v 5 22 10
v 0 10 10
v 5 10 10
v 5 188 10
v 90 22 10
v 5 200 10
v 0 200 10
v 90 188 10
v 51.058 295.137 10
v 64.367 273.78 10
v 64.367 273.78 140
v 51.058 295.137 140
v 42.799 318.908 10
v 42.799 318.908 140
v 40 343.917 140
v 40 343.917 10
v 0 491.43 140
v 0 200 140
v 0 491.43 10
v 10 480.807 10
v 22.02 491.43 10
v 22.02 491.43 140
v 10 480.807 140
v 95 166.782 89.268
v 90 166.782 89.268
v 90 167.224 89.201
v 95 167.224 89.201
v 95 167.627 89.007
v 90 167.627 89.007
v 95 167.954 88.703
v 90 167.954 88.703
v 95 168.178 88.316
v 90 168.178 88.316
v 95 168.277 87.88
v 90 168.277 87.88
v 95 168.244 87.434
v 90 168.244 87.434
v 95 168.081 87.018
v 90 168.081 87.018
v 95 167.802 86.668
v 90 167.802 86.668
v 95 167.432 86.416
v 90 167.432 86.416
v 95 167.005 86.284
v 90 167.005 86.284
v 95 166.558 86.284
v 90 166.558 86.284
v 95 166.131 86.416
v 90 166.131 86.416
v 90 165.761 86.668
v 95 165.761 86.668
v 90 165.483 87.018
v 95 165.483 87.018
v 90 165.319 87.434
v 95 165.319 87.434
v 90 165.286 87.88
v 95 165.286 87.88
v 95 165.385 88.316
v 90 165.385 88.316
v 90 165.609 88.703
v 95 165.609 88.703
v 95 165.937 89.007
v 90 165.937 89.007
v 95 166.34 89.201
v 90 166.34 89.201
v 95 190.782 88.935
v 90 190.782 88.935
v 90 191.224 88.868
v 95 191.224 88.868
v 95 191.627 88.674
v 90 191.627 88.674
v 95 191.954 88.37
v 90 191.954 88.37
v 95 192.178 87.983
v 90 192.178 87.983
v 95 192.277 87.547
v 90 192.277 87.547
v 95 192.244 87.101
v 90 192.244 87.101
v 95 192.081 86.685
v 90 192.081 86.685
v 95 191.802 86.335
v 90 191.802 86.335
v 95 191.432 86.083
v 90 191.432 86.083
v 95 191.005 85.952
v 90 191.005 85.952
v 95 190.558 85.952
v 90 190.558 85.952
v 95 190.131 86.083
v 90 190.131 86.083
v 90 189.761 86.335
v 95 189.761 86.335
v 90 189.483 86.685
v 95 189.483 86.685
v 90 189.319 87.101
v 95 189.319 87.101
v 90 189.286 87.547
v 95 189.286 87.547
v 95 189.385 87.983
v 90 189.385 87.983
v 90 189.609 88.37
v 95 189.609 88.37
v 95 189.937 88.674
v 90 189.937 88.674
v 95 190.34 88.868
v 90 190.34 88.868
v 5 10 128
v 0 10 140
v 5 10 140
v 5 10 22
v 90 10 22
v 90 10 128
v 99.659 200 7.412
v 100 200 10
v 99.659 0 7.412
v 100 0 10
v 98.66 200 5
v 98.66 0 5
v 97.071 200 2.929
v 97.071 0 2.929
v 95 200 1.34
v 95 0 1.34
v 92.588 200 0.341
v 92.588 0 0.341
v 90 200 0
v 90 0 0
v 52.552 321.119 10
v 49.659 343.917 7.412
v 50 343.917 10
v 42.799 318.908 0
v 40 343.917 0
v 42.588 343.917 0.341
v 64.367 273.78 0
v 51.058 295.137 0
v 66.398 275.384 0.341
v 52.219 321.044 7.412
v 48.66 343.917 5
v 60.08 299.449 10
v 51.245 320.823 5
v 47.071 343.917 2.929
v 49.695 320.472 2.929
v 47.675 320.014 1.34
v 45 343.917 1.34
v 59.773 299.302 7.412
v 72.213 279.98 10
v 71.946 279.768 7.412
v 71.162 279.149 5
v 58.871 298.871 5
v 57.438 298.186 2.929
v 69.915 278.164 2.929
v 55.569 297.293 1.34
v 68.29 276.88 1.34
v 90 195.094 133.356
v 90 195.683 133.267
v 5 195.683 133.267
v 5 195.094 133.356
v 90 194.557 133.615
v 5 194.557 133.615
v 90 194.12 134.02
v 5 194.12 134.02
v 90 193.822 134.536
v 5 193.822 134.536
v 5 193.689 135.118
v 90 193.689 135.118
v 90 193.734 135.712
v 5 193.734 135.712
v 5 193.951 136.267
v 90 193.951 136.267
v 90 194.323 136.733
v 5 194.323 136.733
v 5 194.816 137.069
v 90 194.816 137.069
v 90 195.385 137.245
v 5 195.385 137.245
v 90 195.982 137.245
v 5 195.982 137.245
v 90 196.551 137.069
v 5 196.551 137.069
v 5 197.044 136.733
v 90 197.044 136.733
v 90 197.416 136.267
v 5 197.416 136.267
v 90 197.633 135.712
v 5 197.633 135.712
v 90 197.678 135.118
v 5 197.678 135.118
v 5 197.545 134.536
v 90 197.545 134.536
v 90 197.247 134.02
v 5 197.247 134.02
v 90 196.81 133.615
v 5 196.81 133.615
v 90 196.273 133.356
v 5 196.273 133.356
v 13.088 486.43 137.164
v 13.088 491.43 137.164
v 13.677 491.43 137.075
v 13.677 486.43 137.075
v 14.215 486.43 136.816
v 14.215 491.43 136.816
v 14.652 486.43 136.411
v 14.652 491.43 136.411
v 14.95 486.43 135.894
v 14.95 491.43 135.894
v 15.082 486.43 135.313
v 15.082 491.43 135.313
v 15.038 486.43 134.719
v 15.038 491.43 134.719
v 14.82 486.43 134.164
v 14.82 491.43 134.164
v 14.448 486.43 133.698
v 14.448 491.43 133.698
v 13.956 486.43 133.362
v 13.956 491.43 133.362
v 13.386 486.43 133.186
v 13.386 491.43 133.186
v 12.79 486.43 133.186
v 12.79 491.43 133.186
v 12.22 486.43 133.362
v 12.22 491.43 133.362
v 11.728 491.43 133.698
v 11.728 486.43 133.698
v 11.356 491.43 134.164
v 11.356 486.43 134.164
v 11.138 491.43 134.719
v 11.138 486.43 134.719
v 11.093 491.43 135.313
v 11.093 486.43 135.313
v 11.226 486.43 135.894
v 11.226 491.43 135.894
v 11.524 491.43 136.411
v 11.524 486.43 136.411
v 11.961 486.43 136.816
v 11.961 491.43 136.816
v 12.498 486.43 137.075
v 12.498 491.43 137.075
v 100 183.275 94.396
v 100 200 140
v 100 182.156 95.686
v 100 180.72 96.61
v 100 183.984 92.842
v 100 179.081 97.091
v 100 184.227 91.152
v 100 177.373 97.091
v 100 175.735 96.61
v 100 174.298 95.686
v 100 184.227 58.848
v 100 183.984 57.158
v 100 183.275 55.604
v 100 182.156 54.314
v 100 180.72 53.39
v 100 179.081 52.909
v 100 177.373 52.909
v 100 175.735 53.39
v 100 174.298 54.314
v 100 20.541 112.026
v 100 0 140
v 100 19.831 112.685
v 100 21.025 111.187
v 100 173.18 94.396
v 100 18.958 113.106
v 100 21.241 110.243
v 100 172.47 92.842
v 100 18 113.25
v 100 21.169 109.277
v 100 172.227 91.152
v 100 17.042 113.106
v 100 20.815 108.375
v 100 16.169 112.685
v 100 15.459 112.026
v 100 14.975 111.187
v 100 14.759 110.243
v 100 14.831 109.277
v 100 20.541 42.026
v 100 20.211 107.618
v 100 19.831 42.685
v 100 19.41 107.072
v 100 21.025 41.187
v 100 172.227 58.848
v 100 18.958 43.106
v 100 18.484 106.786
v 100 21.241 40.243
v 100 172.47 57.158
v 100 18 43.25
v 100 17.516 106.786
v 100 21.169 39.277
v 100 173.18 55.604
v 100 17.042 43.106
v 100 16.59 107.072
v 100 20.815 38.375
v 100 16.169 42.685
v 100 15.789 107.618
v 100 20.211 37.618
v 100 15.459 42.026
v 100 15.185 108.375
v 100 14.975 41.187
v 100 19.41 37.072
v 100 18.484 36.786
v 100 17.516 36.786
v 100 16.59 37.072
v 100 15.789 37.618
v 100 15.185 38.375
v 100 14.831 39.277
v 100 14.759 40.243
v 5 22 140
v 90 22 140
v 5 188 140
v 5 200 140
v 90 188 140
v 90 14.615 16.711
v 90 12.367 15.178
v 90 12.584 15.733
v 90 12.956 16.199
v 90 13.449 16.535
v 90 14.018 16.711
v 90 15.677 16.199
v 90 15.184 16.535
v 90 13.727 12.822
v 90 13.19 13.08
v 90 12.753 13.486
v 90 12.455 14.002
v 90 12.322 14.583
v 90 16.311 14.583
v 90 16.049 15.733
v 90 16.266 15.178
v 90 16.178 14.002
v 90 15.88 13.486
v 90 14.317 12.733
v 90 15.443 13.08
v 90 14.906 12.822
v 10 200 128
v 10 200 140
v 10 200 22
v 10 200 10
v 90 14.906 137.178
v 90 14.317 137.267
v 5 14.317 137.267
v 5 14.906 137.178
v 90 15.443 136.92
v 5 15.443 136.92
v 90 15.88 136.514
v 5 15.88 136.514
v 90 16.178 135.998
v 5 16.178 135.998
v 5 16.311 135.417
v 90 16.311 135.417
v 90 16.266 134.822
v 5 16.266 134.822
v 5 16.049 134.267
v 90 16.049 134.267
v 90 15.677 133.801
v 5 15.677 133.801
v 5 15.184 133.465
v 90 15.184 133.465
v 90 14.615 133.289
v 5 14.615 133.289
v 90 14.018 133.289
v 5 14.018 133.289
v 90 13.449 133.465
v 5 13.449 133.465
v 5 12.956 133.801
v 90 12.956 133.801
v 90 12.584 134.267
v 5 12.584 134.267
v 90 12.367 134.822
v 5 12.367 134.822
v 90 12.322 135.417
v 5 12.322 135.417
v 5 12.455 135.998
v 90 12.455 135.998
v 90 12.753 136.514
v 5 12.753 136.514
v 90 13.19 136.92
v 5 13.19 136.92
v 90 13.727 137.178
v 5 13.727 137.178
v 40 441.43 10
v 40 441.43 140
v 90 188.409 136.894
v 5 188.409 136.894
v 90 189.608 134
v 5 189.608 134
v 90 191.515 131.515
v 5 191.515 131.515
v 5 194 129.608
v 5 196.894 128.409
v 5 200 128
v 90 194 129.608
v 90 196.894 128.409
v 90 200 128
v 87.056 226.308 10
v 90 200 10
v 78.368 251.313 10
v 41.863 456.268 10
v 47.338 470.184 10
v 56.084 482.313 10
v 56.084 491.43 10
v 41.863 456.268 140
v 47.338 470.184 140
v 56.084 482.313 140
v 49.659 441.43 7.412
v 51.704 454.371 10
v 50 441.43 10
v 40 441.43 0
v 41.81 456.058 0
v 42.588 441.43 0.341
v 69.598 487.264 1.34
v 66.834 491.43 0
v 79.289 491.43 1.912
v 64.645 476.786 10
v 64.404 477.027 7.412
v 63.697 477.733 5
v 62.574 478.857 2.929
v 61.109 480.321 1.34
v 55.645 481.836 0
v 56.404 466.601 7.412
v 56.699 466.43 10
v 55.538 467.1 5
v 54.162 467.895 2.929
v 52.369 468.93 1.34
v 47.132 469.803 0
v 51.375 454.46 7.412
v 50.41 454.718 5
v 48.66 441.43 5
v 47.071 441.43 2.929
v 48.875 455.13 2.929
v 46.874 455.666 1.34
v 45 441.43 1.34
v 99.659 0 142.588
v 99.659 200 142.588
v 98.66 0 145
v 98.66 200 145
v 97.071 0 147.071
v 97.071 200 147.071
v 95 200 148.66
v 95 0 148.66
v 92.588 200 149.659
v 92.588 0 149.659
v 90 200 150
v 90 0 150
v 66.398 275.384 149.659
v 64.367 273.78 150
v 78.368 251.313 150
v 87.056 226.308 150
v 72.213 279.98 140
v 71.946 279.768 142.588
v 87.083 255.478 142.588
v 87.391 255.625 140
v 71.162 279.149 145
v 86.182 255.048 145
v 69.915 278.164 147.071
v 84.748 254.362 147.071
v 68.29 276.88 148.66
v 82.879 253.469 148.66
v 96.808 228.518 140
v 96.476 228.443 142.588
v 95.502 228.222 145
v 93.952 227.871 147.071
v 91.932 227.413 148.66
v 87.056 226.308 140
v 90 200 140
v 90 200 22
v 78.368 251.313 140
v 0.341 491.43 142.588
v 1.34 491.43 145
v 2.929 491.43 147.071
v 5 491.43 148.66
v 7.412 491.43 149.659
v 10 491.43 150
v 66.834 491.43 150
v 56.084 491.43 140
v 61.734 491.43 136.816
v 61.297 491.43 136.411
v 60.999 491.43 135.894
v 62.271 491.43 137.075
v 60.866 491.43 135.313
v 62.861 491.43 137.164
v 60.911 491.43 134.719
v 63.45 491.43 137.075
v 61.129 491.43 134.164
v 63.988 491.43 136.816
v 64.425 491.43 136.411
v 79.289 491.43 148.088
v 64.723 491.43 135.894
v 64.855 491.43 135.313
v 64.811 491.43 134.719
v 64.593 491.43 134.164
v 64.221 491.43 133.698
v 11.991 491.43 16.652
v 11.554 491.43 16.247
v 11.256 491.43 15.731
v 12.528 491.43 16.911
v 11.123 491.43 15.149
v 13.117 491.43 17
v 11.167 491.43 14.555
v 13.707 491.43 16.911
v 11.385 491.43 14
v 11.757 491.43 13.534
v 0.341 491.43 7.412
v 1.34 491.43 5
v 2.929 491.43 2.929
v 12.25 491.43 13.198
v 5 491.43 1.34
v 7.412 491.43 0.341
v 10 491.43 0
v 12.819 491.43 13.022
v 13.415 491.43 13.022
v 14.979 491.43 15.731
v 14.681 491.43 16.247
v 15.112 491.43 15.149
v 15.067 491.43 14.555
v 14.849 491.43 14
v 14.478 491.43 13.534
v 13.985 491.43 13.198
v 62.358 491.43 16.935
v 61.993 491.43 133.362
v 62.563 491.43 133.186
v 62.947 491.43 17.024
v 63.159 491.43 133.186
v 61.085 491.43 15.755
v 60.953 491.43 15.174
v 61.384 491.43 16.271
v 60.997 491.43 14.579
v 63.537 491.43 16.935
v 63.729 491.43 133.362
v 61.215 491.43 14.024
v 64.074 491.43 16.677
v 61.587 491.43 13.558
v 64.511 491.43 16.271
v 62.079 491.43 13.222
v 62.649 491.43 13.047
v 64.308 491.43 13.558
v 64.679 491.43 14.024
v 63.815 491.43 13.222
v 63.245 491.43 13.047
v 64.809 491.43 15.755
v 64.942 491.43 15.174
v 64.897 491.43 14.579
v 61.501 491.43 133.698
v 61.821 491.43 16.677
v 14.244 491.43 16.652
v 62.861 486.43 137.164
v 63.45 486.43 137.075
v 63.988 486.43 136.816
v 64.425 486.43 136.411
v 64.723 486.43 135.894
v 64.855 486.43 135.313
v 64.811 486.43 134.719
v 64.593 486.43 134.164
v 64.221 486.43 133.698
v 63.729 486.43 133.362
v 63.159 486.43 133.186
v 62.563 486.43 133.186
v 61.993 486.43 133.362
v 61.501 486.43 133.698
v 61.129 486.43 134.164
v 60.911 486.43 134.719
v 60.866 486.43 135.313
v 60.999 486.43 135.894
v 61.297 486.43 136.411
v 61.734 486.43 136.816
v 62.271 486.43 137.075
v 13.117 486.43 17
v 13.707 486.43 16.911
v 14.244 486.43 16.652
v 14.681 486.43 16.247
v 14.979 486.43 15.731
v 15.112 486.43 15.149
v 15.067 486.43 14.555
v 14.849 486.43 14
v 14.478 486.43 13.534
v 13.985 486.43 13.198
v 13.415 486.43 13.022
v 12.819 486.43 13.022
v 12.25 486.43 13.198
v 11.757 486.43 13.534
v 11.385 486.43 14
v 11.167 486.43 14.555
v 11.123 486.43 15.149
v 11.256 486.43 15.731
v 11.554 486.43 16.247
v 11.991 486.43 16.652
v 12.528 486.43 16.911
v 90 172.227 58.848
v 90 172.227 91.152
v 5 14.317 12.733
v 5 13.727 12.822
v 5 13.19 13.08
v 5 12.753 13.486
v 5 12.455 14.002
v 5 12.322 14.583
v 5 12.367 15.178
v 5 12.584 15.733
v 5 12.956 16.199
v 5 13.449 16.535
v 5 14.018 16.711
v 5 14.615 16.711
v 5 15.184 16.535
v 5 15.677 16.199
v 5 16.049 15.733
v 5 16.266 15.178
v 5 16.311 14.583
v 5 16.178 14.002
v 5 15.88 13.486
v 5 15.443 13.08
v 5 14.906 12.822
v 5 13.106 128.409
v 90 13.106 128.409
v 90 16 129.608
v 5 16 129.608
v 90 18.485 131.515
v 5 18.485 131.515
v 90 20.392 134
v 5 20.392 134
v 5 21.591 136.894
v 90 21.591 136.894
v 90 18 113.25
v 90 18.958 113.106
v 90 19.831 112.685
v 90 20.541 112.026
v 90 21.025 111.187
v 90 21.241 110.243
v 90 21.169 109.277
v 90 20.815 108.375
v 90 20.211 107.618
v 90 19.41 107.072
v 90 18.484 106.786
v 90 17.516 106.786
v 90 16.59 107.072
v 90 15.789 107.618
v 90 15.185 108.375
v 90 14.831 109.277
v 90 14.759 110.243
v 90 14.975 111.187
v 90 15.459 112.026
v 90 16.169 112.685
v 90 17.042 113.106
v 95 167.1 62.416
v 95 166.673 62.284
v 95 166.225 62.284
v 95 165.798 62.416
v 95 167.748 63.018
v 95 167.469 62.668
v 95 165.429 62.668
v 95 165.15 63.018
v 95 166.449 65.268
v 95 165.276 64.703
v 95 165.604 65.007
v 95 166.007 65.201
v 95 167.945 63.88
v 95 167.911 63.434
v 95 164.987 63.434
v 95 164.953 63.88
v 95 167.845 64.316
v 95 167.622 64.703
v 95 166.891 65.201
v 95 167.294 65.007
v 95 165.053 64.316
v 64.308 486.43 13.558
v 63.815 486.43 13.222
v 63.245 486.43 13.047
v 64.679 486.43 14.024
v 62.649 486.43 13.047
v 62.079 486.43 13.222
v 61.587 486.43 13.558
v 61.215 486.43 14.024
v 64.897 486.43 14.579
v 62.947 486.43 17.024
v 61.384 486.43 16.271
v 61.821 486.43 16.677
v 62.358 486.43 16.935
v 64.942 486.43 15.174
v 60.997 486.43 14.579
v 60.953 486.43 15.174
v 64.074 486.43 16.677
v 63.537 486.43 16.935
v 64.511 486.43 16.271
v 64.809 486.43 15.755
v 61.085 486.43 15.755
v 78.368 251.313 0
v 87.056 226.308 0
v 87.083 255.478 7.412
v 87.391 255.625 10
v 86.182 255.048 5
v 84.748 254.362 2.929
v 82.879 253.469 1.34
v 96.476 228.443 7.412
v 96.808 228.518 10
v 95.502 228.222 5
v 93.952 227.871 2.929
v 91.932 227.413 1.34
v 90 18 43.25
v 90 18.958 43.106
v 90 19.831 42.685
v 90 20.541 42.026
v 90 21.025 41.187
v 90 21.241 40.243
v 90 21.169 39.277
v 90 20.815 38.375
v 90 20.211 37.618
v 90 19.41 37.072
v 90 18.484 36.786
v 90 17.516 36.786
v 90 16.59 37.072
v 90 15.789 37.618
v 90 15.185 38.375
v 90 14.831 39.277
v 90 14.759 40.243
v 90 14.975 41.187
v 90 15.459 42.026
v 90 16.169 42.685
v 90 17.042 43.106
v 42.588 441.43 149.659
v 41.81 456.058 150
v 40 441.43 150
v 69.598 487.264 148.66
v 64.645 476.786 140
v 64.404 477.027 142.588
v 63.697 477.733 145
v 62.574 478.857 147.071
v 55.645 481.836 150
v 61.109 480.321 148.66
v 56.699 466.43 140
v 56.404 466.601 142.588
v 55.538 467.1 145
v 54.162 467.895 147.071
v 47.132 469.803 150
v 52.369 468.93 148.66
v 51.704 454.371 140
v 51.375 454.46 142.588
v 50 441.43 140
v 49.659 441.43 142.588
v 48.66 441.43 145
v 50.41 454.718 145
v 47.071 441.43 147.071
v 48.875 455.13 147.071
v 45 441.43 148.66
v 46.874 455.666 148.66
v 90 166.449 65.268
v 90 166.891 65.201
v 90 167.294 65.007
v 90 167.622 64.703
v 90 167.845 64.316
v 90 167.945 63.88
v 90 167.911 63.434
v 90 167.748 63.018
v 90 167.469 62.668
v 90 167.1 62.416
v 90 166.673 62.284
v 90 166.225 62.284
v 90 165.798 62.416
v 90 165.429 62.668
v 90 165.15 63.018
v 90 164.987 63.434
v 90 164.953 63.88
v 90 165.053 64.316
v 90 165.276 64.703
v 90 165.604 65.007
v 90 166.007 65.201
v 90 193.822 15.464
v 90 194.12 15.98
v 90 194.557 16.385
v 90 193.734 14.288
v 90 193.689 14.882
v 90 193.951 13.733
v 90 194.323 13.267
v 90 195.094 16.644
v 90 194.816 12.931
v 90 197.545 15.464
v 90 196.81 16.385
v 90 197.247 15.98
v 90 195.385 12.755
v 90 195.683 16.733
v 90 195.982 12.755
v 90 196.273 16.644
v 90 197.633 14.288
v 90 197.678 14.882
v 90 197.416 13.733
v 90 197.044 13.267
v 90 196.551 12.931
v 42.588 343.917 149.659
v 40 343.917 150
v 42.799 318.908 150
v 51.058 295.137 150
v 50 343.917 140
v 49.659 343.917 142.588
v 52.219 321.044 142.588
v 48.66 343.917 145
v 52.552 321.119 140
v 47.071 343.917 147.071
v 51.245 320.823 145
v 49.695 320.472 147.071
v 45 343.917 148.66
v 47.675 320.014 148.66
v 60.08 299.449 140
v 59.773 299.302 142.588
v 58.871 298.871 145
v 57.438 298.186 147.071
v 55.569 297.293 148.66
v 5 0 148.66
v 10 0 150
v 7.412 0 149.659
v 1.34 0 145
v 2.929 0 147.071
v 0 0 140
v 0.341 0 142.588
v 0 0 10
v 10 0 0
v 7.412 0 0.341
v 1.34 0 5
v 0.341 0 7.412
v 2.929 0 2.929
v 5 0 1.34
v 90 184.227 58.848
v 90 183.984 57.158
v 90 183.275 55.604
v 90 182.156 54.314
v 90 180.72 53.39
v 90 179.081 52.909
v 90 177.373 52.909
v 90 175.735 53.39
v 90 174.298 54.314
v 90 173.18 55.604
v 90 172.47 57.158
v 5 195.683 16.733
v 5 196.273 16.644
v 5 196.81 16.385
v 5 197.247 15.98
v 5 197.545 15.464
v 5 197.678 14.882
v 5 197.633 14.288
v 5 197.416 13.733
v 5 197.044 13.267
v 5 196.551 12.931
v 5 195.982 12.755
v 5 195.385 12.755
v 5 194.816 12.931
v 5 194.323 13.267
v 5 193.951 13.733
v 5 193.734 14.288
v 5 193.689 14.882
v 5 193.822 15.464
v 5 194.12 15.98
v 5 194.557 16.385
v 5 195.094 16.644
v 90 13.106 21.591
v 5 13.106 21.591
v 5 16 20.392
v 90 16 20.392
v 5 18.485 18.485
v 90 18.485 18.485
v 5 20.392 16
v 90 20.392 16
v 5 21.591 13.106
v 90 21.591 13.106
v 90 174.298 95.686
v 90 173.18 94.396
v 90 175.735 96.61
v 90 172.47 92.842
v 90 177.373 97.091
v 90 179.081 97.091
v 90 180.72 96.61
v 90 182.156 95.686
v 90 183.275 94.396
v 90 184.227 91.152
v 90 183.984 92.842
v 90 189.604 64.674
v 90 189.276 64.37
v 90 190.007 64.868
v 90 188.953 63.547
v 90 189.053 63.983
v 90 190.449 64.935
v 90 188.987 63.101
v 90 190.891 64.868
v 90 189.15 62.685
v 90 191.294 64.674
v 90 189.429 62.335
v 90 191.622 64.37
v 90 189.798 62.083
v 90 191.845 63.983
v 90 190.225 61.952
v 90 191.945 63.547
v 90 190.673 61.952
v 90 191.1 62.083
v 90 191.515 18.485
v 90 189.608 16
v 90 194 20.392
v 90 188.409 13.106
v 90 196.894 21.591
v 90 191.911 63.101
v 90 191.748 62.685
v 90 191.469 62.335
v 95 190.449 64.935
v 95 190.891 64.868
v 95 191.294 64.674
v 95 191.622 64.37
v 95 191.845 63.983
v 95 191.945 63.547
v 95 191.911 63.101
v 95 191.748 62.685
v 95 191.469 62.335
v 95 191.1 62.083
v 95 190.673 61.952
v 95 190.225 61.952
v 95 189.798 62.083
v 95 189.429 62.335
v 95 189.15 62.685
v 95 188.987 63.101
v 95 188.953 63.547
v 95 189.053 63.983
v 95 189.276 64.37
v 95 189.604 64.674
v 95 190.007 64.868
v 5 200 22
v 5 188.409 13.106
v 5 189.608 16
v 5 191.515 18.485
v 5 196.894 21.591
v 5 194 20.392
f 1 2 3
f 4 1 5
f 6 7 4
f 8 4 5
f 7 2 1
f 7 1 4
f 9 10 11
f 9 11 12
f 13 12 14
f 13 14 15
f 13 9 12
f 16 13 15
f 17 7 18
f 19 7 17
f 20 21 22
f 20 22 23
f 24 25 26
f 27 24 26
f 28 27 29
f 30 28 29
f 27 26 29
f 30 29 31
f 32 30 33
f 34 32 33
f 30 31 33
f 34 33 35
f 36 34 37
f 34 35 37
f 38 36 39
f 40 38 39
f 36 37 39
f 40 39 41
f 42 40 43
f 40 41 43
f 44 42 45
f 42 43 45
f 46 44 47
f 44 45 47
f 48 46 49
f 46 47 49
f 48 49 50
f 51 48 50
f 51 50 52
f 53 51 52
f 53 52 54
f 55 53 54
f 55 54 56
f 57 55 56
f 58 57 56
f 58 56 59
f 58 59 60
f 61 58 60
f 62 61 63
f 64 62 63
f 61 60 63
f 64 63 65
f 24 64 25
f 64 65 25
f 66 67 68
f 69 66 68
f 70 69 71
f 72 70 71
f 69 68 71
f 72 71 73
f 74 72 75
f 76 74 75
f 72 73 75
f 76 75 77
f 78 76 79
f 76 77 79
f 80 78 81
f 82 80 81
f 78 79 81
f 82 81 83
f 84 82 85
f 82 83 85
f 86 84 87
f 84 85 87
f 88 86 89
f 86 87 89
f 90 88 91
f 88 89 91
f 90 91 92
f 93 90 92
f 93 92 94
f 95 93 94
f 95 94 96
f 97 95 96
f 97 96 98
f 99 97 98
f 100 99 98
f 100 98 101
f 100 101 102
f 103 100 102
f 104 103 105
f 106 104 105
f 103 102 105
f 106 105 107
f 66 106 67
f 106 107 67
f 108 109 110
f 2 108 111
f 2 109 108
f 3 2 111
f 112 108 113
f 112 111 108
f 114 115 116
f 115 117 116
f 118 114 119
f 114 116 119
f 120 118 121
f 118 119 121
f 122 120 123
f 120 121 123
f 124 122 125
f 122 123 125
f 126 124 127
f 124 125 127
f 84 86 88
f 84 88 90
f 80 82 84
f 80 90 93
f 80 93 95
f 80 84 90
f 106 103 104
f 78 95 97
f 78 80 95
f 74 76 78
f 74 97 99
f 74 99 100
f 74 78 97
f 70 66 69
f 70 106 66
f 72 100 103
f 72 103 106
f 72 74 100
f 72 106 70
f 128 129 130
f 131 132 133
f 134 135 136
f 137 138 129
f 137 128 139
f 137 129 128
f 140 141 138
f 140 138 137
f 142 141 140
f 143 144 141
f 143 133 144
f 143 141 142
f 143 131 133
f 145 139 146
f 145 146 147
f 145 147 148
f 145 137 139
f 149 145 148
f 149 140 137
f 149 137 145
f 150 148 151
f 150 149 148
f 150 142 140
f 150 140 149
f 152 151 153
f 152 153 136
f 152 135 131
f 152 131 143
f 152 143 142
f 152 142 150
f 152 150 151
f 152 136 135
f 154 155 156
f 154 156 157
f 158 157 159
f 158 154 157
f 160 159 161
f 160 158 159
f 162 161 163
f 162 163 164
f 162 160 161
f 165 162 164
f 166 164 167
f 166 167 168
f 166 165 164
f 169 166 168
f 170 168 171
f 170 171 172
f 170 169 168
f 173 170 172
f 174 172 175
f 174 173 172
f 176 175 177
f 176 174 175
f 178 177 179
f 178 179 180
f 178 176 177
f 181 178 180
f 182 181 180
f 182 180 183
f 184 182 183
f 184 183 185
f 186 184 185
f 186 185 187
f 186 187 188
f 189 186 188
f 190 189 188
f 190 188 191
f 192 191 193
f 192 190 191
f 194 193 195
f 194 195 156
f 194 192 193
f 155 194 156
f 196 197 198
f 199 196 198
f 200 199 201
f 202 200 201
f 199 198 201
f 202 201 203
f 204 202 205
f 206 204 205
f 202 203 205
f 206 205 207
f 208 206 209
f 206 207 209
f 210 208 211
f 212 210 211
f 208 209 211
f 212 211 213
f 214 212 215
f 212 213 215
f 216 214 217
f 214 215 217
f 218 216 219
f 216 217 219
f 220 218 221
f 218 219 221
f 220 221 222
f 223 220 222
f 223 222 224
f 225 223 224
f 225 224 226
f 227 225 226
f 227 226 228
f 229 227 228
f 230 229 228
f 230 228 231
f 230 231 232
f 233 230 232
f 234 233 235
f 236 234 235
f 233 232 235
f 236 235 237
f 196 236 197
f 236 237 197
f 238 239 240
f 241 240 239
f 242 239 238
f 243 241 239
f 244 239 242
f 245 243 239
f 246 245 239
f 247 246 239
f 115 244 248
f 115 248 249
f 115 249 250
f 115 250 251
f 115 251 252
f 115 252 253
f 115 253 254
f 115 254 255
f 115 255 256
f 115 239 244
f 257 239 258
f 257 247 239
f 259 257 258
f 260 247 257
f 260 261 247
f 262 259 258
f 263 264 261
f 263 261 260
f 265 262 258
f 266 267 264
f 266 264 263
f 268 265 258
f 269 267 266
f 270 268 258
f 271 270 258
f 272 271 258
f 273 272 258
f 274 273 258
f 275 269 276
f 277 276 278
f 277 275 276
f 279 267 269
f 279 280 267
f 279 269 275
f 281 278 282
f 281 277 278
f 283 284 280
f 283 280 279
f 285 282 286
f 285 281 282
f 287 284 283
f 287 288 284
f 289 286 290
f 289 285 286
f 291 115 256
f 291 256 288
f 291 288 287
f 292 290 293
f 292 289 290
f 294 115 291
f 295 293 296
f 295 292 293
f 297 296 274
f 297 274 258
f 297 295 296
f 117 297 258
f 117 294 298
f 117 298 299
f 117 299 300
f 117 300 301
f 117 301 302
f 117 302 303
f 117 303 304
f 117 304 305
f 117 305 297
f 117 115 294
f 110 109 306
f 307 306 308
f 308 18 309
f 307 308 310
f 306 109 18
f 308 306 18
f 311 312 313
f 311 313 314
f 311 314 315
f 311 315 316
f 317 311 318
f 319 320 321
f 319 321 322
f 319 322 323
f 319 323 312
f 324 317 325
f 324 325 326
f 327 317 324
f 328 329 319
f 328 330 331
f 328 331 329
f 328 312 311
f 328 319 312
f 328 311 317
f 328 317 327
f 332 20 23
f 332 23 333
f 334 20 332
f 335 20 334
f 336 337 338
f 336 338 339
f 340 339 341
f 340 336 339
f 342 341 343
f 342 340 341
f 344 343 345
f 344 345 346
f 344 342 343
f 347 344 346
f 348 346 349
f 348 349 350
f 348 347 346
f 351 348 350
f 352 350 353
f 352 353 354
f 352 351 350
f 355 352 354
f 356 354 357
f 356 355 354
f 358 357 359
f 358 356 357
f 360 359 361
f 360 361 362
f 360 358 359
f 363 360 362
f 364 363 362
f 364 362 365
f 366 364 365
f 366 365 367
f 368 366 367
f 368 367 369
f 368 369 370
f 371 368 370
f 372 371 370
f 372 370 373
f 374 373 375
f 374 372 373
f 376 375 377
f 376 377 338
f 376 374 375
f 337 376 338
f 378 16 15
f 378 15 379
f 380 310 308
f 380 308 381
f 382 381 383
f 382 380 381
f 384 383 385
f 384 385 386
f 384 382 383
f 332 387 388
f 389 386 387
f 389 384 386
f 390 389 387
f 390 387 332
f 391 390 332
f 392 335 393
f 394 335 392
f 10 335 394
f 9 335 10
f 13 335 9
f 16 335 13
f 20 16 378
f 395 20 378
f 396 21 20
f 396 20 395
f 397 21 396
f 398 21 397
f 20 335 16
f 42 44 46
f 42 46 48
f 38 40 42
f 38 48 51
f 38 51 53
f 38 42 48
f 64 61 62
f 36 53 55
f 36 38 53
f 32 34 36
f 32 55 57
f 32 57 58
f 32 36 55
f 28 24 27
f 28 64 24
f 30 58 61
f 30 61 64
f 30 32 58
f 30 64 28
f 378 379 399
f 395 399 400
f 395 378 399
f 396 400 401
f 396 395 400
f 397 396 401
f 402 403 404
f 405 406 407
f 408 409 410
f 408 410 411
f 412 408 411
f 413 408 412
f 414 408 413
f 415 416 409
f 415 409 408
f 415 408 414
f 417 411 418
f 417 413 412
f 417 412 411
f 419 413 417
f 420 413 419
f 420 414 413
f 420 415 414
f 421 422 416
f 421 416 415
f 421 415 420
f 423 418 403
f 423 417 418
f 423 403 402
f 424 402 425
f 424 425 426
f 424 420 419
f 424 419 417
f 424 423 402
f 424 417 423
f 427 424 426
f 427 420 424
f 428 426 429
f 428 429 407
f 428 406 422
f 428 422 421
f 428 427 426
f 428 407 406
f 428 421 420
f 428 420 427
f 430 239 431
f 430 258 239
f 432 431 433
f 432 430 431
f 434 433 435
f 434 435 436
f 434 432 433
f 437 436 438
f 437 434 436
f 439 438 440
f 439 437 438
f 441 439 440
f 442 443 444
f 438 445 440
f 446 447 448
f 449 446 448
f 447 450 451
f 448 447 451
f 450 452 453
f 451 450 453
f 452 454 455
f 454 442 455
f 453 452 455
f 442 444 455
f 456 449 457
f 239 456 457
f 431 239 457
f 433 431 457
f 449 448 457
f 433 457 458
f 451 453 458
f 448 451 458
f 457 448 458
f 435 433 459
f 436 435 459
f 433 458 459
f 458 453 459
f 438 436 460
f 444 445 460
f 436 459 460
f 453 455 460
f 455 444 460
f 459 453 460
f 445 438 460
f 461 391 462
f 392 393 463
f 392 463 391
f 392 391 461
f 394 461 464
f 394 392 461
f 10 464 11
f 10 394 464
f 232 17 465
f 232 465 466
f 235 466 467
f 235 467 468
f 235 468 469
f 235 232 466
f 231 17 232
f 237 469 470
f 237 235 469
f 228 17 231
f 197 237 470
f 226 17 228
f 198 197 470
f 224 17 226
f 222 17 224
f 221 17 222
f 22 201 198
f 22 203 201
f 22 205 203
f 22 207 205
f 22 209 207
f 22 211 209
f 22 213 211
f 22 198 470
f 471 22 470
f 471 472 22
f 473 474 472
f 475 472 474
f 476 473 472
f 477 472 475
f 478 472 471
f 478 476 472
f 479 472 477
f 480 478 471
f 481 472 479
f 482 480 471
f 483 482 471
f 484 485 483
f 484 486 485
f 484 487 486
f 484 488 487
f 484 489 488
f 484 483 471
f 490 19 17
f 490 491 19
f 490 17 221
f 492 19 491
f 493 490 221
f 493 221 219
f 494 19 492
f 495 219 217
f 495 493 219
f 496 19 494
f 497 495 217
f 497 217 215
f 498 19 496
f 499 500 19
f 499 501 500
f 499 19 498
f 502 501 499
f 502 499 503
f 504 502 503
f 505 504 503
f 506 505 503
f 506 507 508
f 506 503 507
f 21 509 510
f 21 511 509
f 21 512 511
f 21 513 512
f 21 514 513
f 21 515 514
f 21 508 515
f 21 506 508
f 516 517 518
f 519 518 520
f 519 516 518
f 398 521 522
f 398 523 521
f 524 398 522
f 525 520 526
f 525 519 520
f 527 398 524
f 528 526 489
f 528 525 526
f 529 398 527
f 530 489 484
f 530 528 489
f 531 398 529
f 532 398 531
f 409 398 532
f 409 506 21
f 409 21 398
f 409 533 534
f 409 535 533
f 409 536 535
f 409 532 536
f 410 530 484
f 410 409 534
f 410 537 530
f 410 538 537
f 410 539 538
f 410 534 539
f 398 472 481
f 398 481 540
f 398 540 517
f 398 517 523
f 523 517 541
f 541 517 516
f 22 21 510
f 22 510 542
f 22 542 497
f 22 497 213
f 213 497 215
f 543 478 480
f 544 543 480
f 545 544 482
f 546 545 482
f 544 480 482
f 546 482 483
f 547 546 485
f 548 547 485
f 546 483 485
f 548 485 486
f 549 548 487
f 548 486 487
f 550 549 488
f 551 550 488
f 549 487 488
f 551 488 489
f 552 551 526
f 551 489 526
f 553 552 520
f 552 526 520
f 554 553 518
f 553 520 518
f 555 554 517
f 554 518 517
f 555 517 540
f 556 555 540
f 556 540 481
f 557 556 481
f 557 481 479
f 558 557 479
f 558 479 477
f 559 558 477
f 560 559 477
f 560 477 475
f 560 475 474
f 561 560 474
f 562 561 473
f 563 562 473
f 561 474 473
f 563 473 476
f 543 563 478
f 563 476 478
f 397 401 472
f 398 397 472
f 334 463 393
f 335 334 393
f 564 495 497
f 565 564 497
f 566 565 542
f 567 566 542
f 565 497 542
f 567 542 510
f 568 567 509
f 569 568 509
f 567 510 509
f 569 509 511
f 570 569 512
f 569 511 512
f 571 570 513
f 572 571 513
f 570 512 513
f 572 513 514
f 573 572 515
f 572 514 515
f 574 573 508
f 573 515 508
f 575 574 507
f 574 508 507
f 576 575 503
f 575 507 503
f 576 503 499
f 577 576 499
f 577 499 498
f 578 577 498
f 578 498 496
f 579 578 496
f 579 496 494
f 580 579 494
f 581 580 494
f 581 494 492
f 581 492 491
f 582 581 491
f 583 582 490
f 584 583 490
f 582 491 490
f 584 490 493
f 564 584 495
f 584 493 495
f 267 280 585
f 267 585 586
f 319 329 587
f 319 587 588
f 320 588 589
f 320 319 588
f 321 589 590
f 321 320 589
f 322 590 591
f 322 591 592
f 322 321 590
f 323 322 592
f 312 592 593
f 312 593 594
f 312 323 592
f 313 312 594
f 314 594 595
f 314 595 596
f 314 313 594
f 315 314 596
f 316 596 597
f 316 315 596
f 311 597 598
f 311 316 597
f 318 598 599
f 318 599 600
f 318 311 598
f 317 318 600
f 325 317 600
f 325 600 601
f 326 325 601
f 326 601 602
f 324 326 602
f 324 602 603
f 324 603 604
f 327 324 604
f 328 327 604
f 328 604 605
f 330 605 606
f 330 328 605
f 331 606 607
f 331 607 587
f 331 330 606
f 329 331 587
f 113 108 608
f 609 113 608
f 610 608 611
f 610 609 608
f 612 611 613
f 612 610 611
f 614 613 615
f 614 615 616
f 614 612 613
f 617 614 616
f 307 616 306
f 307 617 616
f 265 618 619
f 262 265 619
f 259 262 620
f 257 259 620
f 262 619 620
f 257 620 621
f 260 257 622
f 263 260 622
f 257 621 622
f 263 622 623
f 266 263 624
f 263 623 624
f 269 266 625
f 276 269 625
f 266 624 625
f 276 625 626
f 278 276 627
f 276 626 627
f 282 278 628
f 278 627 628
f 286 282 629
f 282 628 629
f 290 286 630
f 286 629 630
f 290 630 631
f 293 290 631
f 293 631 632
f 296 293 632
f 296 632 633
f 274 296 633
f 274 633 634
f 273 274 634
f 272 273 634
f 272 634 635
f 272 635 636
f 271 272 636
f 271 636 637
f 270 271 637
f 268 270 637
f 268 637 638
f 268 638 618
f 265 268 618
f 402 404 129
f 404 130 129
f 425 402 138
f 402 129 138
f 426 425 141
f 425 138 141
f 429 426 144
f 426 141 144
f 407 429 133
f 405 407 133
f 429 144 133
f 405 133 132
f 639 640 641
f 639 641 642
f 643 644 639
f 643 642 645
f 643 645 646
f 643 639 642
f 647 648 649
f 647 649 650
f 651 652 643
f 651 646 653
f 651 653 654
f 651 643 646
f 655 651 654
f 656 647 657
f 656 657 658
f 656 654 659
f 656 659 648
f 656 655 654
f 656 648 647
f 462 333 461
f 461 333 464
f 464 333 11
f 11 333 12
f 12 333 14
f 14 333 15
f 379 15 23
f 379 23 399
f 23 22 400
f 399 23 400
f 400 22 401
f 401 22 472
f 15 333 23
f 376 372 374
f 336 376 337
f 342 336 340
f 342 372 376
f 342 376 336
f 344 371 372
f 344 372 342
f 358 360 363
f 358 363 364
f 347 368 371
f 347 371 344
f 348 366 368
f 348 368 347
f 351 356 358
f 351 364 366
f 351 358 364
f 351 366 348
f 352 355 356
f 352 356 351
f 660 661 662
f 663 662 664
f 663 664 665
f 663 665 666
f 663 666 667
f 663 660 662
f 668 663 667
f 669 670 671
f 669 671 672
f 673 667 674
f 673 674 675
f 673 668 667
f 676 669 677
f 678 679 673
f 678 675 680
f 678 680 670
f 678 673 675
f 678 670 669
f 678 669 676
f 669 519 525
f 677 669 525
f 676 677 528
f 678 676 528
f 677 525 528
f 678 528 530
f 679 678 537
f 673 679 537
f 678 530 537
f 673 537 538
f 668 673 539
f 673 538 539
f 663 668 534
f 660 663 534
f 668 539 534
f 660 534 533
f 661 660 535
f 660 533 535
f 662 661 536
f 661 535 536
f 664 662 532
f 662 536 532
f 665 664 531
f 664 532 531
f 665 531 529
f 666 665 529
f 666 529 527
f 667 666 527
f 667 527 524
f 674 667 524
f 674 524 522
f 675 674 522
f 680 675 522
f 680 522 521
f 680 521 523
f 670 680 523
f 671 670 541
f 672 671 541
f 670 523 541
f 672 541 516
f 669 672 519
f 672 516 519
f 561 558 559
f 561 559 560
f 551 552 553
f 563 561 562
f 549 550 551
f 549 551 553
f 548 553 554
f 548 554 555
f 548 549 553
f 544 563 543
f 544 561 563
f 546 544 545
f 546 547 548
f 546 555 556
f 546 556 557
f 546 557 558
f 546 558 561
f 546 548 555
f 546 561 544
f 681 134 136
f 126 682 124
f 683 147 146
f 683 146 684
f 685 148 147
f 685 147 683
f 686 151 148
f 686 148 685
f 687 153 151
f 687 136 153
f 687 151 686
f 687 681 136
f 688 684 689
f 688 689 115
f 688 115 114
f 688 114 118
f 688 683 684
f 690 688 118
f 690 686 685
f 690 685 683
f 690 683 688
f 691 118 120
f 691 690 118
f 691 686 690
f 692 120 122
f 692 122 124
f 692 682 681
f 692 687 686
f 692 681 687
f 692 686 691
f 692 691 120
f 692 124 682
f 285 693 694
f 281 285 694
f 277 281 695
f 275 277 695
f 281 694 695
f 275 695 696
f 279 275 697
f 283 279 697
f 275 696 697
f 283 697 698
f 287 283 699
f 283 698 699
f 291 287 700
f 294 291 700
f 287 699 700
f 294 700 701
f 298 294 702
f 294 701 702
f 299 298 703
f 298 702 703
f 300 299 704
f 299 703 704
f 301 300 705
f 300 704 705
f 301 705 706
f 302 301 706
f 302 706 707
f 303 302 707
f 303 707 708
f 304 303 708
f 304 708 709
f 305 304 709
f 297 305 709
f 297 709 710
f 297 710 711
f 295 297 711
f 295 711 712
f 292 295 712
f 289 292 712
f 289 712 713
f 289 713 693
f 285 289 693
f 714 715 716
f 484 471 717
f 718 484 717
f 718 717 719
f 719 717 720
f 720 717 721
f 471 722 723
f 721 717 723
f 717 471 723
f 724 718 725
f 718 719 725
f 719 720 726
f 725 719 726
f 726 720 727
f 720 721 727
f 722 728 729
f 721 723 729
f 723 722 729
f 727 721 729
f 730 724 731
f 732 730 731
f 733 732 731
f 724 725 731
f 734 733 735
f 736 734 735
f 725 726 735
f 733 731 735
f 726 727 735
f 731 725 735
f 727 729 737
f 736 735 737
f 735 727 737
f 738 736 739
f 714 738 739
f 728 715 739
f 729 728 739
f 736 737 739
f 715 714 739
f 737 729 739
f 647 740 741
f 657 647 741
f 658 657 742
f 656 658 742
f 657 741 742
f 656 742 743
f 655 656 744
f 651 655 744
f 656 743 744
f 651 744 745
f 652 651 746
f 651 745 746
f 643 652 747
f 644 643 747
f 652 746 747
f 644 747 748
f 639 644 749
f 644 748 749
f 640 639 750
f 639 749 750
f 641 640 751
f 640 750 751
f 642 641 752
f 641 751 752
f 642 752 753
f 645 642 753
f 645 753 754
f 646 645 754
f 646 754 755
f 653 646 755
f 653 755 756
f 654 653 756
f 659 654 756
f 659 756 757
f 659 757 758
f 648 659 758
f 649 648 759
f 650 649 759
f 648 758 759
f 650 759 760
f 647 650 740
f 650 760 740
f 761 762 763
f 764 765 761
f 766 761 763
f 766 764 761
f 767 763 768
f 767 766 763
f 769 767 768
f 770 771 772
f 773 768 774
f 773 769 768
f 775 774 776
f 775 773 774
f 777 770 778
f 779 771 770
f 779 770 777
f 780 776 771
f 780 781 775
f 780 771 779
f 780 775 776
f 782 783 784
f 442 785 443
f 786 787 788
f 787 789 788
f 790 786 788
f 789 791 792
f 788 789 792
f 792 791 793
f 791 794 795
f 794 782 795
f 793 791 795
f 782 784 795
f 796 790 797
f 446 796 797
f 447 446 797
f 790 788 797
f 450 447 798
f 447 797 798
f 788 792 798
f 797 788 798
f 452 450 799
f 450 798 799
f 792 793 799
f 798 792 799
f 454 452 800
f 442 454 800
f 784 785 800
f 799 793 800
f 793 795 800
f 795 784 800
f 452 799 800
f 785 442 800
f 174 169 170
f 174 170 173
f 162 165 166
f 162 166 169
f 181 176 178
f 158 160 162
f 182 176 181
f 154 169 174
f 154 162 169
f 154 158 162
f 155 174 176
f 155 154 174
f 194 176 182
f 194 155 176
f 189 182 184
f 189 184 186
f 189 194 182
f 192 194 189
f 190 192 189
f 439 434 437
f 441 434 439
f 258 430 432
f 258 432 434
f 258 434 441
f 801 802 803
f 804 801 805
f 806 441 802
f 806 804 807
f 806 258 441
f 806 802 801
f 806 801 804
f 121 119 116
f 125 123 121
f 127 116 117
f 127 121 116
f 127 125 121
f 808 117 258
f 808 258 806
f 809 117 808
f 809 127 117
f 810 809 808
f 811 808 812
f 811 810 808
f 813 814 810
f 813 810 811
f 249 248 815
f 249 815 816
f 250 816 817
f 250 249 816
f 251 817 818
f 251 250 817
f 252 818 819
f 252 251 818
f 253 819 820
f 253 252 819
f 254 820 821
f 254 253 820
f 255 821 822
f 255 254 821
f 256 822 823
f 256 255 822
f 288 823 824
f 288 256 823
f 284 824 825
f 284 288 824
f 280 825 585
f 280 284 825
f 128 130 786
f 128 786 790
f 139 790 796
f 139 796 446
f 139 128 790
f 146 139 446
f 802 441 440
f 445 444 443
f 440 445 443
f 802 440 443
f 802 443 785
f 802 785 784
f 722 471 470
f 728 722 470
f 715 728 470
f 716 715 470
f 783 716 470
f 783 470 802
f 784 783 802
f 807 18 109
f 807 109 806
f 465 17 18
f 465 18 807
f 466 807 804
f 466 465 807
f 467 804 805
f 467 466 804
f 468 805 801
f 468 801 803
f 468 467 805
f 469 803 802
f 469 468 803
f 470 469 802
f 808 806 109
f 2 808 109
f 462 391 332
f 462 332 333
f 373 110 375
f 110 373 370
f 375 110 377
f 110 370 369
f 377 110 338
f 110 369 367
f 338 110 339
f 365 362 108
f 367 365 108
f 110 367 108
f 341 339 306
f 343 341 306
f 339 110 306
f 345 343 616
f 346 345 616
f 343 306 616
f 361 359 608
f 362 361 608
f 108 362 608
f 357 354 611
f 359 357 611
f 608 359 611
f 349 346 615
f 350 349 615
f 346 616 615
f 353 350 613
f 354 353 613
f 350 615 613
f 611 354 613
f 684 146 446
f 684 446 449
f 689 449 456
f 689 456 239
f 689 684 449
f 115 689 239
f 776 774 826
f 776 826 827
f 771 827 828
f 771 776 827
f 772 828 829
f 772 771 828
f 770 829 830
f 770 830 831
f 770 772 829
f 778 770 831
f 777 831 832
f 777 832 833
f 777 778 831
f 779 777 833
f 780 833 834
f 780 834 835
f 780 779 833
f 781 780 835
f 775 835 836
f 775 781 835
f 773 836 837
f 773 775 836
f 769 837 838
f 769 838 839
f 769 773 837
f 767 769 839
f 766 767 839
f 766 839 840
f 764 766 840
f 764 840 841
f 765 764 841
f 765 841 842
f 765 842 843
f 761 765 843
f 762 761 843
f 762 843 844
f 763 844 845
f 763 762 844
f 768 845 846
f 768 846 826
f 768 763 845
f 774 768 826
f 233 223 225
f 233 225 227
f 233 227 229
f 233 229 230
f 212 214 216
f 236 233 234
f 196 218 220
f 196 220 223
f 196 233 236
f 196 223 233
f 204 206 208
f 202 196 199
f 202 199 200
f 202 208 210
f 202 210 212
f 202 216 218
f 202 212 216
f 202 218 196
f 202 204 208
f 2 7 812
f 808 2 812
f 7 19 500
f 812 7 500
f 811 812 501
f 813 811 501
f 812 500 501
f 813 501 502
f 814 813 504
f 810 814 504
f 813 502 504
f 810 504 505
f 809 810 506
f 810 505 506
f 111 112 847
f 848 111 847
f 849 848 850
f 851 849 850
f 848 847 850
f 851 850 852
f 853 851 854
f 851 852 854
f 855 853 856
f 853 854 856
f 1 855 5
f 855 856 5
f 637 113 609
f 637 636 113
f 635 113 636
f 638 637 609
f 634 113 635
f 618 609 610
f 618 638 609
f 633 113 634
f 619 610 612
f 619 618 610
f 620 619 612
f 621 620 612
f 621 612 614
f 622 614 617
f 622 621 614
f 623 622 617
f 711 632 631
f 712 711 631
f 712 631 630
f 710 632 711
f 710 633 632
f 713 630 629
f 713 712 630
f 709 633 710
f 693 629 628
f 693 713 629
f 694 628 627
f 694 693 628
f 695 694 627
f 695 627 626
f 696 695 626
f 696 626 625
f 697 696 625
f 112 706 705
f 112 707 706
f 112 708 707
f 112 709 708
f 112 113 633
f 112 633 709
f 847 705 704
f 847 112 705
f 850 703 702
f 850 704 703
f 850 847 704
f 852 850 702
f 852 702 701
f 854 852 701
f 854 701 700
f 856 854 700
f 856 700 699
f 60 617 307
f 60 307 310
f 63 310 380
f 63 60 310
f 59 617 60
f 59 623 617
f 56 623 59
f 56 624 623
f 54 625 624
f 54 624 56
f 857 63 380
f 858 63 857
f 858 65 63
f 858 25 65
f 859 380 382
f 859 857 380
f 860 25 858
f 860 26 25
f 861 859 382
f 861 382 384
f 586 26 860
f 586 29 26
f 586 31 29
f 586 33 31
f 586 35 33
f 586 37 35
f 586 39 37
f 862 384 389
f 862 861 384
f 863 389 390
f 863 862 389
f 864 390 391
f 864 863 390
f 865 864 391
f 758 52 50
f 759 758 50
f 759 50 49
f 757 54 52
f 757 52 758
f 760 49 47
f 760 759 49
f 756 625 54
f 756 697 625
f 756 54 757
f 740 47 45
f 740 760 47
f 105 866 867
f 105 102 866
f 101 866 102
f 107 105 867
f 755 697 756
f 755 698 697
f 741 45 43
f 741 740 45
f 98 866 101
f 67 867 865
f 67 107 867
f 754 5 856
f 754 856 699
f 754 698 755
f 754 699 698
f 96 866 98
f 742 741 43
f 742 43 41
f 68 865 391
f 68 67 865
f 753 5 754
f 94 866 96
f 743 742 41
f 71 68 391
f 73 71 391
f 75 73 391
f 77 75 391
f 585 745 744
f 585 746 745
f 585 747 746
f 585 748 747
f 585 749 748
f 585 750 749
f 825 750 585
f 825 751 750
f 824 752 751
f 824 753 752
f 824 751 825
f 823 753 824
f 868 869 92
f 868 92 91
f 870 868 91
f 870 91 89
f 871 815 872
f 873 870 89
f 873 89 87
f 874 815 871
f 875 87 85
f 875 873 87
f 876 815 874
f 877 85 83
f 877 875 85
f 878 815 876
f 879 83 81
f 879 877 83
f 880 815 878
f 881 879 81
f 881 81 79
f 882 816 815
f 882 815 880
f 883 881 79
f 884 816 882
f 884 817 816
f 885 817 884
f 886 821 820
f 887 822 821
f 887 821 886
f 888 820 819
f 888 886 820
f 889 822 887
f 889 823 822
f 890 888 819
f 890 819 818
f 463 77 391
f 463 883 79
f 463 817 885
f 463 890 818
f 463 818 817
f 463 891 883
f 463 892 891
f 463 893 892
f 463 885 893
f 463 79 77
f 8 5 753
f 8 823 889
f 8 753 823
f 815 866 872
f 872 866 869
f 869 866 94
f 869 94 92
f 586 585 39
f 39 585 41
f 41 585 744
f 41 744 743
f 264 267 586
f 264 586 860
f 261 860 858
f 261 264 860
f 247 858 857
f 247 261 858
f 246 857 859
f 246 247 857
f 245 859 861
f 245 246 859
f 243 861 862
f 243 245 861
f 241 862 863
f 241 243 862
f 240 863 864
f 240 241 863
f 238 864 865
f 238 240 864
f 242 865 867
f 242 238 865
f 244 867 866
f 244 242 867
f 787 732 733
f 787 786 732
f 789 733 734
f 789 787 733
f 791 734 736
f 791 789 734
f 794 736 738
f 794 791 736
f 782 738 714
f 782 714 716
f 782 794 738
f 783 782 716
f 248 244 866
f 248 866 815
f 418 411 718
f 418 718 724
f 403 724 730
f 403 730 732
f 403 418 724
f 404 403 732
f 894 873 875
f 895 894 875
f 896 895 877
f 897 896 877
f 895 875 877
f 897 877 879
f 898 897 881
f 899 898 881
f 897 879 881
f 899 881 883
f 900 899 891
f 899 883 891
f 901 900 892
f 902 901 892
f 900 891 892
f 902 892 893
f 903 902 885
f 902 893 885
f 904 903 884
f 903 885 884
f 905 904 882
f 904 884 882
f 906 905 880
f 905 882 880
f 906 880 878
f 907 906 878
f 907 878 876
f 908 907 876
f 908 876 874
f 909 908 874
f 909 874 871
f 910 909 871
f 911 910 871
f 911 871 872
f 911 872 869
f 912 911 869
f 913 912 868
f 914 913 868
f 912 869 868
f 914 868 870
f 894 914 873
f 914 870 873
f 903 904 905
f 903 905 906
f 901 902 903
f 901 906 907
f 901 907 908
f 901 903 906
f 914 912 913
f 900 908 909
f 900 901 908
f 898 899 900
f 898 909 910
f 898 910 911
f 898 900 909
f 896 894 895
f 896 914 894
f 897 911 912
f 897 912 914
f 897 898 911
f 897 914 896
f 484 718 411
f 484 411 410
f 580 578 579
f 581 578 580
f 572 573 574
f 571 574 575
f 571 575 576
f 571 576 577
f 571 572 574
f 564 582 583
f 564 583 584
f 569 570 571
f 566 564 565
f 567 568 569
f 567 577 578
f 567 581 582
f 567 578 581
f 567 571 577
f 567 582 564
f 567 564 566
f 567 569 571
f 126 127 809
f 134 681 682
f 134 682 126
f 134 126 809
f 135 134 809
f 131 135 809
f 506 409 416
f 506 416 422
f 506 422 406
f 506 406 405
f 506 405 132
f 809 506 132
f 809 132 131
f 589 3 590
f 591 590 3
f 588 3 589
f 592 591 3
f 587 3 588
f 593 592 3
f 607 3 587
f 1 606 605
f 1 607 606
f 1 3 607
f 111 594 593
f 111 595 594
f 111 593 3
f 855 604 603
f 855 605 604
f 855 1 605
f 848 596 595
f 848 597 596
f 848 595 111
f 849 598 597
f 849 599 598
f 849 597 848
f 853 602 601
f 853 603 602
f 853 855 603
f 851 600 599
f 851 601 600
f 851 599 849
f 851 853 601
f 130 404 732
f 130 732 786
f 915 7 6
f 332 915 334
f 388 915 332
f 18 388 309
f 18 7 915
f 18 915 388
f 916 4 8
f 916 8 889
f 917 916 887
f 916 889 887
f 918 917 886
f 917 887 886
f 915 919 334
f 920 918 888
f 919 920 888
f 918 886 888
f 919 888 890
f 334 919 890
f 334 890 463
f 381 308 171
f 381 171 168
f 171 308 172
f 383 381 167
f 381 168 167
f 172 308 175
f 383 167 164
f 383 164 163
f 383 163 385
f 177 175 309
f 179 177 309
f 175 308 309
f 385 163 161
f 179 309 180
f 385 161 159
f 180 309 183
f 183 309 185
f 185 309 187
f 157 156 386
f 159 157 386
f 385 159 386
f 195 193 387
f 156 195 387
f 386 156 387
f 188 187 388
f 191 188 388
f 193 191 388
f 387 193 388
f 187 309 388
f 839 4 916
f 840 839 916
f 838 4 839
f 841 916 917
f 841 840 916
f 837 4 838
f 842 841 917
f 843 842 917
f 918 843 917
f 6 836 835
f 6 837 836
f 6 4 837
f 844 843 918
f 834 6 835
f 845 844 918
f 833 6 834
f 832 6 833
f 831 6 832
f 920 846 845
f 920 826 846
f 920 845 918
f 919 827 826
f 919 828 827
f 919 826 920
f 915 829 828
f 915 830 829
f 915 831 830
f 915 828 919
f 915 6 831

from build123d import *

# Parameters (mm, degrees)
BOSS_EXTRUDE1_DEPTH = 150
FILLET1_R           = 10
SHELL1_START        = 10
SHELL1_DEPTH        = 130
CUT_EXTRUDE1_REACH  = 525.454
CUT_EXTRUDE2_REACH  = 525.454
SKETCH3_W           = 130
SKETCH3_H           = 190
CUT_EXTRUDE3_REACH  = 523.636
SKETCH5_R           = 3.25
SKETCH6_R           = 2
BOSS_EXTRUDE2_DEPTH = 85
CUT_EXTRUDE4_REACH  = 525.454
BOSS_EXTRUDE3_REACH = 522.676
SKETCH9_W           = 10.749668542
SKETCH9_H           = 9.117335181
SKETCH10_R          = 2
CUT_EXTRUDE6_DEPTH  = 5
SKETCH11_R          = 1.5
CUT_EXTRUDE7_DEPTH  = 5


# Read off the part's stored shape, not the designer's step: Shell1
with BuildPart() as part:
    # Sketch1 → Boss-Extrude1 (new body)
    with BuildSketch(Plane.XY):
        with BuildLine():
            Line((0, 200), (0, 491.430499628))
            Line((0, 491.430499628), (100, 491.430499628))
            ThreePointArc((100, 491.430499628), (64.644660941, 476.785838687), (50, 441.430499628))
            Line((50, 441.430499628), (50, 343.917255306))
            ThreePointArc((50, 343.917255306), (55.711486428, 310.074107136), (72.213286827, 279.979749876))
            ThreePointArc((72.213286827, 279.979749876), (92.855472654, 242.334565721), (100, 200))
            Line((100, 200), (100, 0))
            Line((100, 0), (0, 0))
            Line((0, 0), (0, 200))
        make_face()
    extrude(amount=BOSS_EXTRUDE1_DEPTH)

    # Fillet1
    fillet1_edges = [part.edges().sort_by_distance(p)[0] for p in [
        (64.644660941, 476.785838687, 0),
        (50, 392.673877467, 0),
        (55.711486428, 310.074107136, 0),
        (92.855472654, 242.334565721, 0),
        (100, 100, 0),
        (100, 100, 150),
        (92.855472654, 242.334565721, 150),
        (55.711486428, 310.074107136, 150),
        (50, 392.673877467, 150),
        (64.644660941, 476.785838687, 150),
        (0, 245.715249814, 150),
        (0, 245.715249814, 0),
    ]]
    fillet(fillet1_edges, radius=FILLET1_R)

    # Shell1 outline → Shell1 (cut)
    with BuildSketch(Plane.XY.offset(SHELL1_START)):
        with BuildLine():
            Line((10, 10), (90, 10))
            Line((90, 10), (90, 200))
            ThreePointArc((90, 200), (83.409320496, 239.052766003), (64.367328706, 273.779673977))
            ThreePointArc((64.367328706, 273.779673977), (46.265334269, 306.792307417), (40, 343.917255306))
            Line((40, 343.917255306), (40, 441.430499628))
            ThreePointArc((40, 441.430499628), (47.132359263, 469.803242937), (66.833752096, 491.430499628))
            Line((66.833752096, 491.430499628), (10, 491.430499628))
            Line((10, 491.430499628), (10, 10))
        make_face()
    extrude(amount=SHELL1_DEPTH, mode=Mode.SUBTRACT)

    # Sketch2 → Cut-Extrude1 (cut, up to next)
    with BuildSketch(Plane(origin=(100, 0, 0), x_dir=(0, 0, -1), z_dir=(1, 0, 0)), mode=Mode.PRIVATE) as cut_extrude1_sk1:
        with BuildLine():
            Line((-91.151768807, 184.227304536), (-58.848231193, 184.227304536))
            ThreePointArc((-58.848231193, 184.227304536), (-52.848231193, 178.227304536), (-58.848231193, 172.227304536))
            Line((-58.848231193, 172.227304536), (-91.151768807, 172.227304536))
            ThreePointArc((-91.151768807, 172.227304536), (-97.151768807, 178.227304536), (-91.151768807, 184.227304536))
        make_face()
    cut_extrude1_tool1 = extrude(cut_extrude1_sk1.sketch, amount=-CUT_EXTRUDE1_REACH, mode=Mode.PRIVATE) & part.part
    add(cut_extrude1_tool1.solids().sort_by_distance((100, 178.227305, 75))[0], mode=Mode.SUBTRACT)

    # Sketch3 → Cut-Extrude2 (cut, up to next)
    with BuildSketch(Plane.ZY, mode=Mode.PRIVATE) as cut_extrude2_sk1:
        with Locations((75, 105)):
            Rectangle(SKETCH3_W, SKETCH3_H)
    cut_extrude2_tool1 = extrude(cut_extrude2_sk1.sketch, amount=-CUT_EXTRUDE2_REACH, mode=Mode.PRIVATE) & part.part
    add(cut_extrude2_tool1.solids().sort_by_distance((0, 105, 75))[0], mode=Mode.SUBTRACT)

    # Sketch5 → Cut-Extrude3 (cut, up to next)
    with BuildSketch(Plane.ZY.offset(-90), mode=Mode.PRIVATE) as cut_extrude3_sk1:
        with Locations((40, 18)):
            Circle(SKETCH5_R)
    cut_extrude3_tool1 = extrude(cut_extrude3_sk1.sketch, amount=-CUT_EXTRUDE3_REACH, mode=Mode.PRIVATE) & part.part
    # Sketch5 → Cut-Extrude3 (cut, up to next)
    with BuildSketch(Plane.ZY.offset(-90), mode=Mode.PRIVATE) as cut_extrude3_sk2:
        with Locations((110, 18)):
            Circle(SKETCH5_R)
    cut_extrude3_tool2 = extrude(cut_extrude3_sk2.sketch, amount=-CUT_EXTRUDE3_REACH, mode=Mode.PRIVATE) & part.part
    add(cut_extrude3_tool1.solids().sort_by_distance((90, 18, 40))[0], mode=Mode.SUBTRACT)
    add(cut_extrude3_tool2.solids().sort_by_distance((90, 18, 110))[0], mode=Mode.SUBTRACT)

    # Sketch6 → Boss-Extrude2 (add)
    # profile 1 of 4: a face of its own
    with BuildSketch(Plane.ZY.offset(-90)):
        with BuildLine():
            Line((10, 200), (10, 188))
            ThreePointArc((10, 188), (18.485281374, 191.514718626), (22, 200))
            Line((22, 200), (10, 200))
        make_face()
        with Locations((14.732857766, 195.683462966)):
            Circle(SKETCH6_R, mode=Mode.SUBTRACT)
    # profile 2 of 4: a face of its own
    with BuildSketch(Plane.ZY.offset(-90)):
        with BuildLine():
            Line((140, 200), (140, 188))
            ThreePointArc((140, 188), (131.514718626, 191.514718626), (128, 200))
            Line((128, 200), (140, 200))
        make_face()
        with Locations(Location((135.267142234, 195.683462966, 0), (0, 0, 180))):
            Circle(SKETCH6_R, mode=Mode.SUBTRACT)
    # profile 3 of 4: a face of its own
    with BuildSketch(Plane.ZY.offset(-90)):
        with BuildLine():
            Line((140, 10), (128, 10))
            ThreePointArc((128, 10), (131.514718626, 18.485281374), (140, 22))
            Line((140, 22), (140, 10))
        make_face()
        with Locations((135.267142234, 14.316537034)):
            Circle(SKETCH6_R, mode=Mode.SUBTRACT)
    # profile 4 of 4: a face of its own
    with BuildSketch(Plane.ZY.offset(-90)):
        with BuildLine():
            Line((10, 10), (22, 10))
            ThreePointArc((22, 10), (18.485281374, 18.485281374), (10, 22))
            Line((10, 22), (10, 10))
        make_face()
        with Locations(Location((14.732857766, 14.316537034, 0), (0, 0, 180))):
            Circle(SKETCH6_R, mode=Mode.SUBTRACT)
    extrude(amount=BOSS_EXTRUDE2_DEPTH)

    # Sketch8 → Cut-Extrude4 (cut, up to next)
    with BuildSketch(Plane(origin=(0, 0, 0), x_dir=(-1, 0, 0), z_dir=(0, 0, -1)), mode=Mode.PRIVATE) as cut_extrude4_sk1:
        Polygon((-64.644660941, 476.785838687), (-79.289321881, 491.430499628), (-115.095354781, 491.430499628), align=None)
    cut_extrude4_tool1 = extrude(cut_extrude4_sk1.sketch, amount=-CUT_EXTRUDE4_REACH, mode=Mode.PRIVATE) & part.part
    add(cut_extrude4_tool1.solids().sort_by_distance((86.343113, 486.548946, 0))[0], mode=Mode.SUBTRACT)

    # Sketch9 → Boss-Extrude3 (add, up to next)
    with BuildSketch(Plane.XY.offset(10), mode=Mode.PRIVATE) as boss_extrude3_sk1:
        Polygon((22.020157431, 491.430499628), (10, 480.807276536), (10, 491.430499628), align=None)
    boss_extrude3_tool1 = extrude(boss_extrude3_sk1.sketch, amount=BOSS_EXTRUDE3_REACH, mode=Mode.PRIVATE) - part.part
    # Sketch9 → Boss-Extrude3 (add, up to next)
    with BuildSketch(Plane.XY.offset(10), mode=Mode.PRIVATE) as boss_extrude3_sk2:
        with Locations((61.458917825, 486.871832037)):
            Rectangle(SKETCH9_W, SKETCH9_H)
    boss_extrude3_tool2 = extrude(boss_extrude3_sk2.sketch, amount=BOSS_EXTRUDE3_REACH, mode=Mode.PRIVATE) - part.part
    add(boss_extrude3_tool1.solids().sort_by_distance((14.006719, 487.889425, 10))[0])
    add(boss_extrude3_tool2.solids().sort_by_distance((61.458918, 486.871832, 10))[0])

    # Sketch10 → Cut-Extrude6 (cut)
    with BuildSketch(Plane(origin=(0, 491.430499628, 0), x_dir=(1, 0, 0), z_dir=(0, 1, 0))):
        with Locations(Location((13.117335181, -15, 0), (0, 0, 270))):
            Circle(SKETCH10_R)
        with Locations(Location((62.947163257, -15.024173332, 0), (0, 0, 270))):
            Circle(SKETCH10_R)
        with Locations(Location((62.860866202, -135.163680398, 0), (0, 0, 270))):
            Circle(SKETCH10_R)
        with Locations(Location((13.087879919, -135.163680398, 0), (0, 0, 270))):
            Circle(SKETCH10_R)
    extrude(amount=-CUT_EXTRUDE6_DEPTH, mode=Mode.SUBTRACT)

    # Sketch11 → Cut-Extrude7 (cut)
    with BuildSketch(Plane.ZY.offset(-90)):
        with Locations((87.434890577, 190.781669354)):
            Circle(SKETCH11_R)
        with Locations((63.434890577, 190.449058246)):
            Circle(SKETCH11_R)
        with Locations((63.767501685, 166.449058246)):
            Circle(SKETCH11_R)
        with Locations((87.767501685, 166.781669354)):
            Circle(SKETCH11_R)
    extrude(amount=-CUT_EXTRUDE7_DEPTH, mode=Mode.SUBTRACT)


solid = part.part
